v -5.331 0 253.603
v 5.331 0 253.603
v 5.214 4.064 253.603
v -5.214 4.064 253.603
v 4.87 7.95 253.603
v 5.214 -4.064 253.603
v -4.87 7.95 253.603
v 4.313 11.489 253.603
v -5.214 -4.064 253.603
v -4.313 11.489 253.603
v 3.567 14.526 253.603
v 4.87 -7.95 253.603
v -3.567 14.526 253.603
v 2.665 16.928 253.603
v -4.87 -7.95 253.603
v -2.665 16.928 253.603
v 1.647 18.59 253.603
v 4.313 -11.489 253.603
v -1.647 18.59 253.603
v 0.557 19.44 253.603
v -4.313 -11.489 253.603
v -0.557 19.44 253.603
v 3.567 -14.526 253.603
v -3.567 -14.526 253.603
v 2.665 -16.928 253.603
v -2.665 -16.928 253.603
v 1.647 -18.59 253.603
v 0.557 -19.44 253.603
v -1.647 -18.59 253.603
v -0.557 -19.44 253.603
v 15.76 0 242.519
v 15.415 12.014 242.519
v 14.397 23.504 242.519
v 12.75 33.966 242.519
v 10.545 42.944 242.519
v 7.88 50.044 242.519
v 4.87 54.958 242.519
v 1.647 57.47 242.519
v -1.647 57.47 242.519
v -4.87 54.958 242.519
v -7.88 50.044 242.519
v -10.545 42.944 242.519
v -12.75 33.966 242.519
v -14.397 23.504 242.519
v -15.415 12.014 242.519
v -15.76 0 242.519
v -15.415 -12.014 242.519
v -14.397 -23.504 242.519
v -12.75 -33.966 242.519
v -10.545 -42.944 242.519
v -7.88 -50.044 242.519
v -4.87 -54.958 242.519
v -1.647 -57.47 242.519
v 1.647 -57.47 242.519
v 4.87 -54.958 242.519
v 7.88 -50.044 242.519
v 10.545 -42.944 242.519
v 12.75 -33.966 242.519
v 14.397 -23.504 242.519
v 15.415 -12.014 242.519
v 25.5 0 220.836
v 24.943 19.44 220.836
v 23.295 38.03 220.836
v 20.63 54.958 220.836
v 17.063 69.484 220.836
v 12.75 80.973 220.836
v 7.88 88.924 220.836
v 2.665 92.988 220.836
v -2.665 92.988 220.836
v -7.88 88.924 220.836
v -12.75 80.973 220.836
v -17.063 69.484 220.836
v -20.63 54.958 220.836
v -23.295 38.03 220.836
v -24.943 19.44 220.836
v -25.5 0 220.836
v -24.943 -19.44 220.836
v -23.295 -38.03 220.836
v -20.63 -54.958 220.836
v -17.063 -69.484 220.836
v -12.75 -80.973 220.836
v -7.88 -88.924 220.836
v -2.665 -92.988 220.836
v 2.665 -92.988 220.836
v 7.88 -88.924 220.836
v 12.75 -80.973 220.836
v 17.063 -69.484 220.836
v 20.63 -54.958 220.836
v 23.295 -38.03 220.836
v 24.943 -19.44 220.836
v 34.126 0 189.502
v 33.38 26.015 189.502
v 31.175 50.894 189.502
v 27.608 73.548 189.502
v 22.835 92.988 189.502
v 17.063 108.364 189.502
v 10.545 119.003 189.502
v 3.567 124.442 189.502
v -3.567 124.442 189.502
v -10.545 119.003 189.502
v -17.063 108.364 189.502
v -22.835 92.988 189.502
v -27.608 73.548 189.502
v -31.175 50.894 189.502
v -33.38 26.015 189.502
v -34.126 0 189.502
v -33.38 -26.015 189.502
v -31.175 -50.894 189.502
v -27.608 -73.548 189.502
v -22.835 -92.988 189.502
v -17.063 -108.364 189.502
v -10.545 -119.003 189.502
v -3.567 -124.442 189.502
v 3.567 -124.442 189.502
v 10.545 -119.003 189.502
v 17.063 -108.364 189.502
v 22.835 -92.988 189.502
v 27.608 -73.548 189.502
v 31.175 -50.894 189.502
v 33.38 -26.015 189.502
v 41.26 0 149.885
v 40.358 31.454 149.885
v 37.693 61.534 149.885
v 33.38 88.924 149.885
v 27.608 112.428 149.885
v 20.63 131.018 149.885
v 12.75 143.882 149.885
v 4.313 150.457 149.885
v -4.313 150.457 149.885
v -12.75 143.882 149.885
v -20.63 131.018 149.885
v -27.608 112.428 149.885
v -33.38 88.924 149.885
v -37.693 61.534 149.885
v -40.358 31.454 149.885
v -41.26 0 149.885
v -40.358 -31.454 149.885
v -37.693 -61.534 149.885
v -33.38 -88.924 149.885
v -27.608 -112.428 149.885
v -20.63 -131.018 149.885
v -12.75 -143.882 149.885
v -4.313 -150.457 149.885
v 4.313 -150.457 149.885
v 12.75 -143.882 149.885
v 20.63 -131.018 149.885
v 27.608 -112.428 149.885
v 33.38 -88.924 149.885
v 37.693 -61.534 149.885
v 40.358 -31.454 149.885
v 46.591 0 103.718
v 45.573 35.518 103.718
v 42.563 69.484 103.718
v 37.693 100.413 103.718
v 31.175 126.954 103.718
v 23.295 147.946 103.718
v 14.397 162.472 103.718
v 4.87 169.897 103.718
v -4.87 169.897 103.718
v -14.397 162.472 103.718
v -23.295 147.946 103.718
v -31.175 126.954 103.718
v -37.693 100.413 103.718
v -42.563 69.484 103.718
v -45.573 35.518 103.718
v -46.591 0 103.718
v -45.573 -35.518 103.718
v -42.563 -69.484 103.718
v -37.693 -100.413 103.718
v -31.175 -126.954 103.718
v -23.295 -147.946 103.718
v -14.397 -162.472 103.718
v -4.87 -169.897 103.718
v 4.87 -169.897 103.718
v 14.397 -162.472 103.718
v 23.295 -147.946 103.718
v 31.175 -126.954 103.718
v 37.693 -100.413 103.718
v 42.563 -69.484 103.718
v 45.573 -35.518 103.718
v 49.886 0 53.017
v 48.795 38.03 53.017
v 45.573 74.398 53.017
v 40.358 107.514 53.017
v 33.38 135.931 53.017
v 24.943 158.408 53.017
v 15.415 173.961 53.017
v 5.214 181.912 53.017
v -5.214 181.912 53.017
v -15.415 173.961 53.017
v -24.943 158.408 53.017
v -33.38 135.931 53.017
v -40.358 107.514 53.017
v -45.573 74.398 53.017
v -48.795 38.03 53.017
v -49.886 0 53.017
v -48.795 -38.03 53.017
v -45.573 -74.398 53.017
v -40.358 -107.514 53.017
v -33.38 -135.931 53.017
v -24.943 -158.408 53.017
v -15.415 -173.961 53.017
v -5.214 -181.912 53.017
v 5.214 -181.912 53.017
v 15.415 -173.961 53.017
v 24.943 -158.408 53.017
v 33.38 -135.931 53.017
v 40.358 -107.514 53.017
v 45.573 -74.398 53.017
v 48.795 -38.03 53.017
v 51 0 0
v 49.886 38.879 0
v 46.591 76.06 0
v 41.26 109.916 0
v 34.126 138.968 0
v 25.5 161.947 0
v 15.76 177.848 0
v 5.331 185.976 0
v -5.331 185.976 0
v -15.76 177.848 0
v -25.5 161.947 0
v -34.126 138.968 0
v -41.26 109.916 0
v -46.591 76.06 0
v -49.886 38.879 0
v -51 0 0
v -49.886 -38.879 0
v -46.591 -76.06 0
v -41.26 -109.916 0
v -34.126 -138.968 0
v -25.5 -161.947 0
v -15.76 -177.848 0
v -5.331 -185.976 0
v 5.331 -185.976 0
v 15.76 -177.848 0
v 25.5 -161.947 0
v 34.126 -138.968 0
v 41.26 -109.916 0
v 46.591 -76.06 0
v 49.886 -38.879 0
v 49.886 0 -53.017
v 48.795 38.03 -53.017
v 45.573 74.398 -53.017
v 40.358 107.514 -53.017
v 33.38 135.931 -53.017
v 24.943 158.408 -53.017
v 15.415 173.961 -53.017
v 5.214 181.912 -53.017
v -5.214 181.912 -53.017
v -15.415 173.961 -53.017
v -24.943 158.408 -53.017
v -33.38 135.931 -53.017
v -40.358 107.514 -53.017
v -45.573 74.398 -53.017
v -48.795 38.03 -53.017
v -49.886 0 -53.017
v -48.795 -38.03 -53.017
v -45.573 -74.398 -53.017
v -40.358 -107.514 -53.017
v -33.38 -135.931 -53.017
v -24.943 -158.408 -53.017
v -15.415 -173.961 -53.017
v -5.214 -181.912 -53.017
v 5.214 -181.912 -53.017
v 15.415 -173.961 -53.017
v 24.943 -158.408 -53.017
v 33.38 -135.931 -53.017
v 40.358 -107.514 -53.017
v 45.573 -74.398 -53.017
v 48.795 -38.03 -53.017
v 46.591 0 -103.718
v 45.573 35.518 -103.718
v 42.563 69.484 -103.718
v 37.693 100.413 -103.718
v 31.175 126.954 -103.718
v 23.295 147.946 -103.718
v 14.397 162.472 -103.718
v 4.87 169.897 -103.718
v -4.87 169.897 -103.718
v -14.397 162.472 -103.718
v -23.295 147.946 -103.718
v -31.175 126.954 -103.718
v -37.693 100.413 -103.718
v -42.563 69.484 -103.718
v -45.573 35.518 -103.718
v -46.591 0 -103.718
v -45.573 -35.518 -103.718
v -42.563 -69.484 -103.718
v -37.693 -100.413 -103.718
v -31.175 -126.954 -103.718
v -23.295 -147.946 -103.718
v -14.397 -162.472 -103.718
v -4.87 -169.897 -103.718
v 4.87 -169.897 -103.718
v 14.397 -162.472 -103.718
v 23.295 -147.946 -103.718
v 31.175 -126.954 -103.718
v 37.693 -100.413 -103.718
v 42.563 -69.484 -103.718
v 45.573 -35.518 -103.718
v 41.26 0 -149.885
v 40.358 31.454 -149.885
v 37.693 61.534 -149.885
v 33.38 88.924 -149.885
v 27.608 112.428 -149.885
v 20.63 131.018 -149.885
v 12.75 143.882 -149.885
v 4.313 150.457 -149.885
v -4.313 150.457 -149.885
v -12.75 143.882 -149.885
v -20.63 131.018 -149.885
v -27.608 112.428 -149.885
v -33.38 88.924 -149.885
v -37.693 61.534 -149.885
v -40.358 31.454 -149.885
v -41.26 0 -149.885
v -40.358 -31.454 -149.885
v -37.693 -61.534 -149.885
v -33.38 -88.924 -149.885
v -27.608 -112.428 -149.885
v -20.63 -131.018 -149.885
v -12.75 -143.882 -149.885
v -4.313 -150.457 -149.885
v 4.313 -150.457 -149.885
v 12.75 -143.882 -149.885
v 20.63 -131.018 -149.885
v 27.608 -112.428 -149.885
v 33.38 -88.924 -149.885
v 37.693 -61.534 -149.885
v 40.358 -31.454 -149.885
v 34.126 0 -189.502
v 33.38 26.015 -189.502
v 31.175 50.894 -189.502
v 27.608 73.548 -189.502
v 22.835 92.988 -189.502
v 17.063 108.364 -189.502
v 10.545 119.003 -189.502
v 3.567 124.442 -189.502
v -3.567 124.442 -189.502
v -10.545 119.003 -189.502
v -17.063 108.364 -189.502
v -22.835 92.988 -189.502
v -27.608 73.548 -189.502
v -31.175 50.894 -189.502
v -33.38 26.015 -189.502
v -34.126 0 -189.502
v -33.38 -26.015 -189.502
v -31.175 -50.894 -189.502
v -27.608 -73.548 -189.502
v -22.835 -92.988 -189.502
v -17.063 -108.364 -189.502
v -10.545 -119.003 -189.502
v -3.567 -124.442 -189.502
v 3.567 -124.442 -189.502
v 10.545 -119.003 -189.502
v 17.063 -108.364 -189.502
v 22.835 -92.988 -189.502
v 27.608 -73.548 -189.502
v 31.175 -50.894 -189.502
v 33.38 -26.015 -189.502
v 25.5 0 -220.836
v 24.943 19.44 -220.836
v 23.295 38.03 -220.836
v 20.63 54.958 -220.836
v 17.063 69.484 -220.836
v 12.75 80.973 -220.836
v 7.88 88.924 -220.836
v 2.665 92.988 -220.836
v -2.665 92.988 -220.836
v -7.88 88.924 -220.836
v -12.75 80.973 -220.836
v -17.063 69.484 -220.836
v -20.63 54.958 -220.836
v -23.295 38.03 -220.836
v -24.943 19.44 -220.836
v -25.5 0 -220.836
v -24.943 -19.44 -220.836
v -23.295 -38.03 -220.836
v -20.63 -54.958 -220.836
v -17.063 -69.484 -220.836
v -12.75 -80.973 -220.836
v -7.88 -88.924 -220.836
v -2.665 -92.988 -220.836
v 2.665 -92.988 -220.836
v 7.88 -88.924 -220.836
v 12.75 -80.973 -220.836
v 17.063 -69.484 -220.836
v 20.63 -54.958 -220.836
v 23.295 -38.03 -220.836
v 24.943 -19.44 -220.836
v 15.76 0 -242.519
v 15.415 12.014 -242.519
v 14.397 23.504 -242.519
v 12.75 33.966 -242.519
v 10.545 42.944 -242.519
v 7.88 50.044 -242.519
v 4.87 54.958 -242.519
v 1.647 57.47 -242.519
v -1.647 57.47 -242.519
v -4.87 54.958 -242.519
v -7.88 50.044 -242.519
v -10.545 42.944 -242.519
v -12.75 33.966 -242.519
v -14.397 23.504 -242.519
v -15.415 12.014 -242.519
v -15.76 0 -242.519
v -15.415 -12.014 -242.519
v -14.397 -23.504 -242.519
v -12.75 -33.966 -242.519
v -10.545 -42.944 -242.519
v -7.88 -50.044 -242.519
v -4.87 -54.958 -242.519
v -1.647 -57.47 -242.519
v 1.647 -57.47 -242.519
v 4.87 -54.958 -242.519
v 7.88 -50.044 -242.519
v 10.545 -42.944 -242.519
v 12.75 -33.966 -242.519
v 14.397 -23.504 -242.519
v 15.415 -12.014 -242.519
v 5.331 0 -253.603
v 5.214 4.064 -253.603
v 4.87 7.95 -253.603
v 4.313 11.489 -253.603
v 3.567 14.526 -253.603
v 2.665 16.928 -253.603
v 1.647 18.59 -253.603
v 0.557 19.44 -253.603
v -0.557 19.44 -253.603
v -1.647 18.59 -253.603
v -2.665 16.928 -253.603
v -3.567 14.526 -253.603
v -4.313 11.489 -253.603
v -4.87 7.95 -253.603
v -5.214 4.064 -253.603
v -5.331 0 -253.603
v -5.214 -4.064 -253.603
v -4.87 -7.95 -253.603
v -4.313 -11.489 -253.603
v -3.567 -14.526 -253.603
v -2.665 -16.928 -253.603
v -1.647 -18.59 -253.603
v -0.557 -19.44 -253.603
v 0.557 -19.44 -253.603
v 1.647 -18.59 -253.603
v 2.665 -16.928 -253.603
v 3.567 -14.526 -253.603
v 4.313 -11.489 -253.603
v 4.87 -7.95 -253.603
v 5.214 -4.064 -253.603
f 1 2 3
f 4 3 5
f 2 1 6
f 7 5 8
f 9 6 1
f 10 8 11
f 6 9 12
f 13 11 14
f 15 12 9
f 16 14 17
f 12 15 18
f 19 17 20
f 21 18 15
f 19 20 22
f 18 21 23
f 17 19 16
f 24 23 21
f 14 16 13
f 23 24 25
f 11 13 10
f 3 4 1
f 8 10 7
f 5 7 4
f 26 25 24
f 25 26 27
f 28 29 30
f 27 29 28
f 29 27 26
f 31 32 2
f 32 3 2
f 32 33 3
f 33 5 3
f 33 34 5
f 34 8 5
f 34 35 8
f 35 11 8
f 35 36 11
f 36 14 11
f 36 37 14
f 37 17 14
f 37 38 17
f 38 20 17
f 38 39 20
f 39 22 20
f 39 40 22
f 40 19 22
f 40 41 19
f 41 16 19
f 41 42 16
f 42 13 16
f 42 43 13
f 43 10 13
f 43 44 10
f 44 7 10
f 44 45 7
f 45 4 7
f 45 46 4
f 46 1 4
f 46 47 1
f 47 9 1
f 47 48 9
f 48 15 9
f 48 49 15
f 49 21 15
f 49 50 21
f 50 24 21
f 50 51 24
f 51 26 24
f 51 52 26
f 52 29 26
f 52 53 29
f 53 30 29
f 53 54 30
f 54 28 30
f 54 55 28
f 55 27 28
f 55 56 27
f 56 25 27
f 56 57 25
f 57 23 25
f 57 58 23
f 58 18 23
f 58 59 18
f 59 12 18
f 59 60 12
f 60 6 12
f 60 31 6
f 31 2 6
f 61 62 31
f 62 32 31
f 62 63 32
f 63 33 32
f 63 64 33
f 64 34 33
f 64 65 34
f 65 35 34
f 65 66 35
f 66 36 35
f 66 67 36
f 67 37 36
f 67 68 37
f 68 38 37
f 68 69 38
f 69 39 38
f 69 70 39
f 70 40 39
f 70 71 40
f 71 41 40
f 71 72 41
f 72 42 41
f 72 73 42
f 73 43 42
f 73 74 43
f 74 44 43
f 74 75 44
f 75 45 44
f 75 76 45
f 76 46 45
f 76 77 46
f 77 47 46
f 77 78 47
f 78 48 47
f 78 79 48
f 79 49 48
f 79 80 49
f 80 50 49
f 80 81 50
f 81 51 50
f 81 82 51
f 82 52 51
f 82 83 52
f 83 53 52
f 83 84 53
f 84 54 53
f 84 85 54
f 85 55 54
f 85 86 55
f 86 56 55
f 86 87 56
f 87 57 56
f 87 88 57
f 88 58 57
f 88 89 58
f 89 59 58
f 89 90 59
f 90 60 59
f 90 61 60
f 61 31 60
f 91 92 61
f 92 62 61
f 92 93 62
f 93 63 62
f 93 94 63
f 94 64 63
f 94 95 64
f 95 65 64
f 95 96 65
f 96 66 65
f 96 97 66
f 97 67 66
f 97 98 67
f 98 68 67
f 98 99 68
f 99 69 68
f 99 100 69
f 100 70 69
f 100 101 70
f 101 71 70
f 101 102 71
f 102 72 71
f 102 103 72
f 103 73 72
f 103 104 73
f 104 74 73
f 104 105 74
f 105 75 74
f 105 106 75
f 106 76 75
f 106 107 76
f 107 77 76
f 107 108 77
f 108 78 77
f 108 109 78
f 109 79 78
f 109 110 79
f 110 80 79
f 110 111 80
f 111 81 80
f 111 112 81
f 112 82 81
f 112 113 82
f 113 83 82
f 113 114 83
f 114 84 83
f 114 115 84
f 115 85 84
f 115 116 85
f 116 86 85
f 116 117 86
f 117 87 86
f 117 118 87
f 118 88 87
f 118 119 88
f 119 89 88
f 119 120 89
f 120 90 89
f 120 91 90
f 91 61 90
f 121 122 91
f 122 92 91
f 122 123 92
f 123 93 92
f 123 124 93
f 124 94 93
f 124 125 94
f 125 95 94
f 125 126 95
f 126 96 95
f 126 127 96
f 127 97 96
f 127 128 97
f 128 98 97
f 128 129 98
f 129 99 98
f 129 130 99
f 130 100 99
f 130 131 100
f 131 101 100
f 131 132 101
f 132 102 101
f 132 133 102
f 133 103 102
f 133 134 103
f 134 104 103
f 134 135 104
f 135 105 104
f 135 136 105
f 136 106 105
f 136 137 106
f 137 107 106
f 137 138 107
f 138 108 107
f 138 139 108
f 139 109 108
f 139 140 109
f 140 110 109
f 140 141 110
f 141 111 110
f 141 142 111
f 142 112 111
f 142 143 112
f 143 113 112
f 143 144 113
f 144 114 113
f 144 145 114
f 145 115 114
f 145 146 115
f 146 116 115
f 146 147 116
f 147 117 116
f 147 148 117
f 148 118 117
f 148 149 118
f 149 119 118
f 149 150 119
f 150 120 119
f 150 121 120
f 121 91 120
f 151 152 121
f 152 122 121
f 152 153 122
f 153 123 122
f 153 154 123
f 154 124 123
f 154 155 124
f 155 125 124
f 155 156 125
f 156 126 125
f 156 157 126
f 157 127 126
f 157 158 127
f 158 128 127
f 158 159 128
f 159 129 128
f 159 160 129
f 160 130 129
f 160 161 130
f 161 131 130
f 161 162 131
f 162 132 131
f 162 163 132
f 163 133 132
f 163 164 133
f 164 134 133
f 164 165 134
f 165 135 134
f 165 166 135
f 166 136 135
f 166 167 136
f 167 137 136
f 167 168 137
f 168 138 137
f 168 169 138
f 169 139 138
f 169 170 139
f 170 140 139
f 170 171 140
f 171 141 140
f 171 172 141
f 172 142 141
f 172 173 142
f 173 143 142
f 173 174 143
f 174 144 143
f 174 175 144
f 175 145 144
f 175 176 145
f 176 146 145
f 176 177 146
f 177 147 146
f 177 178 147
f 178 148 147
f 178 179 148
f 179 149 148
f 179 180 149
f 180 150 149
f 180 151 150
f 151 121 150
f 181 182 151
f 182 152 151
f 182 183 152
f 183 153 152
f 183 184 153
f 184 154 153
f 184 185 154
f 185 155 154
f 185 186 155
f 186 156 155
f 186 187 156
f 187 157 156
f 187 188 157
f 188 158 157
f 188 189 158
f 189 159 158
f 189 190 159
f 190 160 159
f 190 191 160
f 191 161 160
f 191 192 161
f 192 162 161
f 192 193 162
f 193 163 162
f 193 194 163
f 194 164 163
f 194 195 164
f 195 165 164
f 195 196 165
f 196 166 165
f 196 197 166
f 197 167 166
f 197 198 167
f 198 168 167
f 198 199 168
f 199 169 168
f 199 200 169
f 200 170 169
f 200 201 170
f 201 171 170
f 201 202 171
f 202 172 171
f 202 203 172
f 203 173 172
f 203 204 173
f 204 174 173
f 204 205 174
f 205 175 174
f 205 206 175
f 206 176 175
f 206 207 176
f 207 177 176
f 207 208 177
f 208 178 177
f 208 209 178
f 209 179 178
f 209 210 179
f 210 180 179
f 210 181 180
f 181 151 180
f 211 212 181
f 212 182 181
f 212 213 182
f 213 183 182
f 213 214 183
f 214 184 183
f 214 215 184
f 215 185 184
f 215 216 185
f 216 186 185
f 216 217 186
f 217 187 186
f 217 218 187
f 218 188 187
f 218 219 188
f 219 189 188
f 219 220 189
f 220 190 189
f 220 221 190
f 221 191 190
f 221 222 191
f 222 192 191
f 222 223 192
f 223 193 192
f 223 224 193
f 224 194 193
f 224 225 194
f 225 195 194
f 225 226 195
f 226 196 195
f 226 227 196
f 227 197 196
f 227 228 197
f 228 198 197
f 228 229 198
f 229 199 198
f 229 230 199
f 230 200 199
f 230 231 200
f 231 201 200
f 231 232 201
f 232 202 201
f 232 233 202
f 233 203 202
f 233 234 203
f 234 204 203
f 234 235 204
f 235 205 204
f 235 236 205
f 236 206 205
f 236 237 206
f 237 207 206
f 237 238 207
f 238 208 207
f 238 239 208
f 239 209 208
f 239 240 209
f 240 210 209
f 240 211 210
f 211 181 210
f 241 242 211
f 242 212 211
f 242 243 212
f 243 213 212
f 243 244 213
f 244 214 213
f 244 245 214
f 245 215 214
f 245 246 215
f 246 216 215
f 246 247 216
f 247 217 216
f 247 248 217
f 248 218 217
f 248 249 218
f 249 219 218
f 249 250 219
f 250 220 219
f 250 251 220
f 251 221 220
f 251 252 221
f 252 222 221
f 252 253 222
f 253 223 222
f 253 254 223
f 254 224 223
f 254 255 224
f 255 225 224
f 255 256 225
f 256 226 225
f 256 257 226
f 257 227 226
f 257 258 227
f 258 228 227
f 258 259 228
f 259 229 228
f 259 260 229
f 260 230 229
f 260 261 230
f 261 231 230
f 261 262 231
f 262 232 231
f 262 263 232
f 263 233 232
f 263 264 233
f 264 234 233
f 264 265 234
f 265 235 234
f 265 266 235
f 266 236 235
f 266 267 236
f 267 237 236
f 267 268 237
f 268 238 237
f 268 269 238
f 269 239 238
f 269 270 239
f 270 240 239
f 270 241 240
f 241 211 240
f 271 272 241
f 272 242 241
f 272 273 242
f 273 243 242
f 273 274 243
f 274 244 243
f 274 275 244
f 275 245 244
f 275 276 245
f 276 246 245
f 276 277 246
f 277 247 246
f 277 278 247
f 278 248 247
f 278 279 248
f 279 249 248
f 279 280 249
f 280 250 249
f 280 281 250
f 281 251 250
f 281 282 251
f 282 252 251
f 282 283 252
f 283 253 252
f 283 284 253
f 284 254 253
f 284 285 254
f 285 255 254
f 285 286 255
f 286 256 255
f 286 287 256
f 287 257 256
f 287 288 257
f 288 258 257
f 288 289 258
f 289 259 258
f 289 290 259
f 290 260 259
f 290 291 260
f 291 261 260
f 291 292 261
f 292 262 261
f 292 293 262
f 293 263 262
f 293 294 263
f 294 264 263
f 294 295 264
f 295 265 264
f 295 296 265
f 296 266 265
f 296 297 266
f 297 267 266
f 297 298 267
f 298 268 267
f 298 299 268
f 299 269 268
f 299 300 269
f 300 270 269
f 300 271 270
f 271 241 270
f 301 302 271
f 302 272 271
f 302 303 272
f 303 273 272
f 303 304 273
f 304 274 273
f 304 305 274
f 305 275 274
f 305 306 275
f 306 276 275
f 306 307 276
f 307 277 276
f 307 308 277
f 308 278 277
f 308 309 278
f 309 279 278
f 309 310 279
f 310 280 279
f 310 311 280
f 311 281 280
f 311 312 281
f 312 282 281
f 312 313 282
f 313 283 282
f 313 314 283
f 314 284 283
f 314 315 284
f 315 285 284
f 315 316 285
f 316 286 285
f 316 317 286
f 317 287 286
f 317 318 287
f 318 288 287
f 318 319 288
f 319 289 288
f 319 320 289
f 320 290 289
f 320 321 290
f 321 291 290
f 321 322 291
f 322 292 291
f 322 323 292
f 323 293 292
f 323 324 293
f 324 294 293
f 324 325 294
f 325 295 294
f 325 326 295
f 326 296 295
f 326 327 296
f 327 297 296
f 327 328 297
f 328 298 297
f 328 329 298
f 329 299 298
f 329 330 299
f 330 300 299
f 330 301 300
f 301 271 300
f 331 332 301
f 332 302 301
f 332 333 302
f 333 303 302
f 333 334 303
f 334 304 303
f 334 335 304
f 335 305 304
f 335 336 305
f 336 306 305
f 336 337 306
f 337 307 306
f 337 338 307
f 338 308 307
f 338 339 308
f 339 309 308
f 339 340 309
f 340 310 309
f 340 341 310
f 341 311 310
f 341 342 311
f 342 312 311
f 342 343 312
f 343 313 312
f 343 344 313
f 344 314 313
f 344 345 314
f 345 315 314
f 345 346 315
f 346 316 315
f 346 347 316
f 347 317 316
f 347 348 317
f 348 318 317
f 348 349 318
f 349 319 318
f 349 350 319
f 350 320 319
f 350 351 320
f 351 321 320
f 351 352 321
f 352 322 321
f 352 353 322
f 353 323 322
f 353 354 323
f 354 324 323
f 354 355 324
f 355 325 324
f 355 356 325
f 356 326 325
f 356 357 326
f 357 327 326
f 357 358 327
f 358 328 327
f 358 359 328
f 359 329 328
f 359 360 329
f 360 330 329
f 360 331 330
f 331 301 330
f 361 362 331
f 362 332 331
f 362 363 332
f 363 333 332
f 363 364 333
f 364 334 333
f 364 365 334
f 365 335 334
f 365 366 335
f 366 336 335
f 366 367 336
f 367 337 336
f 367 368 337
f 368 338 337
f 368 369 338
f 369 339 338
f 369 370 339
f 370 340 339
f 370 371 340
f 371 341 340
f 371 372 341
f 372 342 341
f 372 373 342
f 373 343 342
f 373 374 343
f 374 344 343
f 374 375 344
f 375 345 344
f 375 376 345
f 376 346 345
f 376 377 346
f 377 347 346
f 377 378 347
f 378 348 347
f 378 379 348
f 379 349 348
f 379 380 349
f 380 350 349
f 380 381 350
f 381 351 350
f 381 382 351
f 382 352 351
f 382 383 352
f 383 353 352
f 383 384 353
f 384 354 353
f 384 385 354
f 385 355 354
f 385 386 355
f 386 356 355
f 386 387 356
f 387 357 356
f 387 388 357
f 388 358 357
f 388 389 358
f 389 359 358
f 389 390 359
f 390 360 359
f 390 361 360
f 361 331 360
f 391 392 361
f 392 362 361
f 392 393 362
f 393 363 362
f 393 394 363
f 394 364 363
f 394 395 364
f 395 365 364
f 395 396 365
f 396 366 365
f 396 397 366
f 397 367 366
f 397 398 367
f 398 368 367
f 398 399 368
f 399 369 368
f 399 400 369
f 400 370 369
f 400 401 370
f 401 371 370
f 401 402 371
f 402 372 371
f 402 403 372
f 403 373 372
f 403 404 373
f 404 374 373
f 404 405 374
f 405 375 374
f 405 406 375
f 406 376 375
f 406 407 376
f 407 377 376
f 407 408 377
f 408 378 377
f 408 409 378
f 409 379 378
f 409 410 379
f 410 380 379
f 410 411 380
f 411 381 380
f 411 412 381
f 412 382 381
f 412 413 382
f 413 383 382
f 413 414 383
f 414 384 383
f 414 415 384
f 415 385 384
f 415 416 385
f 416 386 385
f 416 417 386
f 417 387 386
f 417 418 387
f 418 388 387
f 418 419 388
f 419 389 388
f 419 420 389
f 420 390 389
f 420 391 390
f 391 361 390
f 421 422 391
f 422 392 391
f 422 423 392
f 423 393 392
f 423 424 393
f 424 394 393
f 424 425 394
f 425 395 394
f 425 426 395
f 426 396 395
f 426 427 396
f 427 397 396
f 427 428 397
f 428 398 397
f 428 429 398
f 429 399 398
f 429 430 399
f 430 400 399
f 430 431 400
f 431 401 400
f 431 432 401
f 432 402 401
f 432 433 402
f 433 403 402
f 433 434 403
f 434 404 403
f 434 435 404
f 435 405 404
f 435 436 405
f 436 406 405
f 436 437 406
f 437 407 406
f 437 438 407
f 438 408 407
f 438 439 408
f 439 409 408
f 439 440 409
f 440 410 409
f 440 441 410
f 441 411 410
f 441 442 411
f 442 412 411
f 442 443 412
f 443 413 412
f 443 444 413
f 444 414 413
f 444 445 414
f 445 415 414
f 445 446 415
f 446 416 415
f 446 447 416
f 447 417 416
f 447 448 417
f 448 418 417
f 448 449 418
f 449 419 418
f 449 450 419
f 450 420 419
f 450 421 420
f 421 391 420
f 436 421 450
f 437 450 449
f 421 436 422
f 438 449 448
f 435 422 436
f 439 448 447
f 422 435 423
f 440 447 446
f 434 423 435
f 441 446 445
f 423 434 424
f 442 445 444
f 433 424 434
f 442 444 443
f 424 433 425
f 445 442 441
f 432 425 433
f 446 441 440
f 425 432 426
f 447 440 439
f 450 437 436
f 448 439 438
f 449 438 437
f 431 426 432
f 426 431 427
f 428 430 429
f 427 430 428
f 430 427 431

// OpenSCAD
// Generated by SolidPython 1.0.1 on 2020-07-29 00:46:45


scale(v = [3, 11, 15]) {
	sphere(r = 17);
}
/***********************************************
*********      SolidPython code:      **********
************************************************
 
# import packages: SolidPython
from solid import *
from solid.utils import *
from itertools import chain, combinations, permutations


class Resize:

    def __init__(self, scad_file):
        self.scad_file = scad_file
        #self.scad_file = import_scad(scad_file)
        # cone/cylinder param:
        self.r1 = 0
        self.r2 = 0
        self.h = 0
        # rectangular prism param:
        self.w = 0
        self.l = 0
        # ellipse param:
        self.r = 0

    # import OpenScad code (file name corresponds to shape)


    # classify shape + parameters
    def assign(self, param1, param2, param3):
        if self.scad_file == 'cone.scad':
            self.r1 = param1
            self.r2 = param2
            self.h = param3
        elif self.scad_file == 'cylinder.scad':
            self.r1 = param1
            self.r2 = param2
            self.h = param3
        elif self.scad_file == 'rectangularPrism.scad':
            self.h = param1
            self.l = param2
            self.w = param3
        else:
            self.r = param1
            self.h = param2

    # resize parameters
    def iterate(self):
        x = range(3, 20, 2)
        i = 1
        if self.scad_file == 'cone.scad':
            tempList = list(permutations(x, 2))
            for temp in tempList:
                param1 = temp[0]
                param2 = temp[1]
                filepath = 'produced_scad_files/' + 'cone' + str(param1) + '_' + str(param2) + '_' + '.scad'
                scad_render_to_file(cylinder(h=param1, r1=param2, r2=0), filepath)

        elif self.scad_file == 'cylinder.scad':
            tempList = list(permutations(x, 3))
            for temp in tempList:
                param1 = temp[0]
                param2 = temp[1]
                filepath = 'produced_scad_files/' + 'cylinder' + str(param1) + '_' + str(param2) + '_' + '.scad'
                scad_render_to_file(cylinder(h=param1, r1=param2, r2=param2), filepath)

        elif self.scad_file == 'rectangularPrism.scad':
            tempList = list(permutations(x, 3))
            for temp in tempList:
                param1 = temp[0]
                param2 = temp[1]
                param3 = temp[2]
                filepath = 'produced_scad_files/' + 'rectangularPrism' + str(param1) + '_' + str(param2) + '_' + str(
                    param3) + '.scad'
                scad_render_to_file(cube(size=(param1, param2, param3)), filepath)

        elif self.scad_file == 'ellipse.scad':
            tempList = list(permutations(x, 4))
            for temp in tempList:
                param1 = temp[0]
                param2 = temp[1]
                param3 = temp[2]
                param4 = temp[3]
                filepath = 'produced_scad_files/' + 'ellipse' + str(param1) + '_' + str(param2) + '_' + str(param3) + '_' + str(param4) + '.scad'
                scad_render_to_file(scale([param1, param2, param3])(sphere(r=param4)), filepath)

    def render_to_scadfile(self):
        scad_render_to_file(scad, 'example.scad') 
 
************************************************/
